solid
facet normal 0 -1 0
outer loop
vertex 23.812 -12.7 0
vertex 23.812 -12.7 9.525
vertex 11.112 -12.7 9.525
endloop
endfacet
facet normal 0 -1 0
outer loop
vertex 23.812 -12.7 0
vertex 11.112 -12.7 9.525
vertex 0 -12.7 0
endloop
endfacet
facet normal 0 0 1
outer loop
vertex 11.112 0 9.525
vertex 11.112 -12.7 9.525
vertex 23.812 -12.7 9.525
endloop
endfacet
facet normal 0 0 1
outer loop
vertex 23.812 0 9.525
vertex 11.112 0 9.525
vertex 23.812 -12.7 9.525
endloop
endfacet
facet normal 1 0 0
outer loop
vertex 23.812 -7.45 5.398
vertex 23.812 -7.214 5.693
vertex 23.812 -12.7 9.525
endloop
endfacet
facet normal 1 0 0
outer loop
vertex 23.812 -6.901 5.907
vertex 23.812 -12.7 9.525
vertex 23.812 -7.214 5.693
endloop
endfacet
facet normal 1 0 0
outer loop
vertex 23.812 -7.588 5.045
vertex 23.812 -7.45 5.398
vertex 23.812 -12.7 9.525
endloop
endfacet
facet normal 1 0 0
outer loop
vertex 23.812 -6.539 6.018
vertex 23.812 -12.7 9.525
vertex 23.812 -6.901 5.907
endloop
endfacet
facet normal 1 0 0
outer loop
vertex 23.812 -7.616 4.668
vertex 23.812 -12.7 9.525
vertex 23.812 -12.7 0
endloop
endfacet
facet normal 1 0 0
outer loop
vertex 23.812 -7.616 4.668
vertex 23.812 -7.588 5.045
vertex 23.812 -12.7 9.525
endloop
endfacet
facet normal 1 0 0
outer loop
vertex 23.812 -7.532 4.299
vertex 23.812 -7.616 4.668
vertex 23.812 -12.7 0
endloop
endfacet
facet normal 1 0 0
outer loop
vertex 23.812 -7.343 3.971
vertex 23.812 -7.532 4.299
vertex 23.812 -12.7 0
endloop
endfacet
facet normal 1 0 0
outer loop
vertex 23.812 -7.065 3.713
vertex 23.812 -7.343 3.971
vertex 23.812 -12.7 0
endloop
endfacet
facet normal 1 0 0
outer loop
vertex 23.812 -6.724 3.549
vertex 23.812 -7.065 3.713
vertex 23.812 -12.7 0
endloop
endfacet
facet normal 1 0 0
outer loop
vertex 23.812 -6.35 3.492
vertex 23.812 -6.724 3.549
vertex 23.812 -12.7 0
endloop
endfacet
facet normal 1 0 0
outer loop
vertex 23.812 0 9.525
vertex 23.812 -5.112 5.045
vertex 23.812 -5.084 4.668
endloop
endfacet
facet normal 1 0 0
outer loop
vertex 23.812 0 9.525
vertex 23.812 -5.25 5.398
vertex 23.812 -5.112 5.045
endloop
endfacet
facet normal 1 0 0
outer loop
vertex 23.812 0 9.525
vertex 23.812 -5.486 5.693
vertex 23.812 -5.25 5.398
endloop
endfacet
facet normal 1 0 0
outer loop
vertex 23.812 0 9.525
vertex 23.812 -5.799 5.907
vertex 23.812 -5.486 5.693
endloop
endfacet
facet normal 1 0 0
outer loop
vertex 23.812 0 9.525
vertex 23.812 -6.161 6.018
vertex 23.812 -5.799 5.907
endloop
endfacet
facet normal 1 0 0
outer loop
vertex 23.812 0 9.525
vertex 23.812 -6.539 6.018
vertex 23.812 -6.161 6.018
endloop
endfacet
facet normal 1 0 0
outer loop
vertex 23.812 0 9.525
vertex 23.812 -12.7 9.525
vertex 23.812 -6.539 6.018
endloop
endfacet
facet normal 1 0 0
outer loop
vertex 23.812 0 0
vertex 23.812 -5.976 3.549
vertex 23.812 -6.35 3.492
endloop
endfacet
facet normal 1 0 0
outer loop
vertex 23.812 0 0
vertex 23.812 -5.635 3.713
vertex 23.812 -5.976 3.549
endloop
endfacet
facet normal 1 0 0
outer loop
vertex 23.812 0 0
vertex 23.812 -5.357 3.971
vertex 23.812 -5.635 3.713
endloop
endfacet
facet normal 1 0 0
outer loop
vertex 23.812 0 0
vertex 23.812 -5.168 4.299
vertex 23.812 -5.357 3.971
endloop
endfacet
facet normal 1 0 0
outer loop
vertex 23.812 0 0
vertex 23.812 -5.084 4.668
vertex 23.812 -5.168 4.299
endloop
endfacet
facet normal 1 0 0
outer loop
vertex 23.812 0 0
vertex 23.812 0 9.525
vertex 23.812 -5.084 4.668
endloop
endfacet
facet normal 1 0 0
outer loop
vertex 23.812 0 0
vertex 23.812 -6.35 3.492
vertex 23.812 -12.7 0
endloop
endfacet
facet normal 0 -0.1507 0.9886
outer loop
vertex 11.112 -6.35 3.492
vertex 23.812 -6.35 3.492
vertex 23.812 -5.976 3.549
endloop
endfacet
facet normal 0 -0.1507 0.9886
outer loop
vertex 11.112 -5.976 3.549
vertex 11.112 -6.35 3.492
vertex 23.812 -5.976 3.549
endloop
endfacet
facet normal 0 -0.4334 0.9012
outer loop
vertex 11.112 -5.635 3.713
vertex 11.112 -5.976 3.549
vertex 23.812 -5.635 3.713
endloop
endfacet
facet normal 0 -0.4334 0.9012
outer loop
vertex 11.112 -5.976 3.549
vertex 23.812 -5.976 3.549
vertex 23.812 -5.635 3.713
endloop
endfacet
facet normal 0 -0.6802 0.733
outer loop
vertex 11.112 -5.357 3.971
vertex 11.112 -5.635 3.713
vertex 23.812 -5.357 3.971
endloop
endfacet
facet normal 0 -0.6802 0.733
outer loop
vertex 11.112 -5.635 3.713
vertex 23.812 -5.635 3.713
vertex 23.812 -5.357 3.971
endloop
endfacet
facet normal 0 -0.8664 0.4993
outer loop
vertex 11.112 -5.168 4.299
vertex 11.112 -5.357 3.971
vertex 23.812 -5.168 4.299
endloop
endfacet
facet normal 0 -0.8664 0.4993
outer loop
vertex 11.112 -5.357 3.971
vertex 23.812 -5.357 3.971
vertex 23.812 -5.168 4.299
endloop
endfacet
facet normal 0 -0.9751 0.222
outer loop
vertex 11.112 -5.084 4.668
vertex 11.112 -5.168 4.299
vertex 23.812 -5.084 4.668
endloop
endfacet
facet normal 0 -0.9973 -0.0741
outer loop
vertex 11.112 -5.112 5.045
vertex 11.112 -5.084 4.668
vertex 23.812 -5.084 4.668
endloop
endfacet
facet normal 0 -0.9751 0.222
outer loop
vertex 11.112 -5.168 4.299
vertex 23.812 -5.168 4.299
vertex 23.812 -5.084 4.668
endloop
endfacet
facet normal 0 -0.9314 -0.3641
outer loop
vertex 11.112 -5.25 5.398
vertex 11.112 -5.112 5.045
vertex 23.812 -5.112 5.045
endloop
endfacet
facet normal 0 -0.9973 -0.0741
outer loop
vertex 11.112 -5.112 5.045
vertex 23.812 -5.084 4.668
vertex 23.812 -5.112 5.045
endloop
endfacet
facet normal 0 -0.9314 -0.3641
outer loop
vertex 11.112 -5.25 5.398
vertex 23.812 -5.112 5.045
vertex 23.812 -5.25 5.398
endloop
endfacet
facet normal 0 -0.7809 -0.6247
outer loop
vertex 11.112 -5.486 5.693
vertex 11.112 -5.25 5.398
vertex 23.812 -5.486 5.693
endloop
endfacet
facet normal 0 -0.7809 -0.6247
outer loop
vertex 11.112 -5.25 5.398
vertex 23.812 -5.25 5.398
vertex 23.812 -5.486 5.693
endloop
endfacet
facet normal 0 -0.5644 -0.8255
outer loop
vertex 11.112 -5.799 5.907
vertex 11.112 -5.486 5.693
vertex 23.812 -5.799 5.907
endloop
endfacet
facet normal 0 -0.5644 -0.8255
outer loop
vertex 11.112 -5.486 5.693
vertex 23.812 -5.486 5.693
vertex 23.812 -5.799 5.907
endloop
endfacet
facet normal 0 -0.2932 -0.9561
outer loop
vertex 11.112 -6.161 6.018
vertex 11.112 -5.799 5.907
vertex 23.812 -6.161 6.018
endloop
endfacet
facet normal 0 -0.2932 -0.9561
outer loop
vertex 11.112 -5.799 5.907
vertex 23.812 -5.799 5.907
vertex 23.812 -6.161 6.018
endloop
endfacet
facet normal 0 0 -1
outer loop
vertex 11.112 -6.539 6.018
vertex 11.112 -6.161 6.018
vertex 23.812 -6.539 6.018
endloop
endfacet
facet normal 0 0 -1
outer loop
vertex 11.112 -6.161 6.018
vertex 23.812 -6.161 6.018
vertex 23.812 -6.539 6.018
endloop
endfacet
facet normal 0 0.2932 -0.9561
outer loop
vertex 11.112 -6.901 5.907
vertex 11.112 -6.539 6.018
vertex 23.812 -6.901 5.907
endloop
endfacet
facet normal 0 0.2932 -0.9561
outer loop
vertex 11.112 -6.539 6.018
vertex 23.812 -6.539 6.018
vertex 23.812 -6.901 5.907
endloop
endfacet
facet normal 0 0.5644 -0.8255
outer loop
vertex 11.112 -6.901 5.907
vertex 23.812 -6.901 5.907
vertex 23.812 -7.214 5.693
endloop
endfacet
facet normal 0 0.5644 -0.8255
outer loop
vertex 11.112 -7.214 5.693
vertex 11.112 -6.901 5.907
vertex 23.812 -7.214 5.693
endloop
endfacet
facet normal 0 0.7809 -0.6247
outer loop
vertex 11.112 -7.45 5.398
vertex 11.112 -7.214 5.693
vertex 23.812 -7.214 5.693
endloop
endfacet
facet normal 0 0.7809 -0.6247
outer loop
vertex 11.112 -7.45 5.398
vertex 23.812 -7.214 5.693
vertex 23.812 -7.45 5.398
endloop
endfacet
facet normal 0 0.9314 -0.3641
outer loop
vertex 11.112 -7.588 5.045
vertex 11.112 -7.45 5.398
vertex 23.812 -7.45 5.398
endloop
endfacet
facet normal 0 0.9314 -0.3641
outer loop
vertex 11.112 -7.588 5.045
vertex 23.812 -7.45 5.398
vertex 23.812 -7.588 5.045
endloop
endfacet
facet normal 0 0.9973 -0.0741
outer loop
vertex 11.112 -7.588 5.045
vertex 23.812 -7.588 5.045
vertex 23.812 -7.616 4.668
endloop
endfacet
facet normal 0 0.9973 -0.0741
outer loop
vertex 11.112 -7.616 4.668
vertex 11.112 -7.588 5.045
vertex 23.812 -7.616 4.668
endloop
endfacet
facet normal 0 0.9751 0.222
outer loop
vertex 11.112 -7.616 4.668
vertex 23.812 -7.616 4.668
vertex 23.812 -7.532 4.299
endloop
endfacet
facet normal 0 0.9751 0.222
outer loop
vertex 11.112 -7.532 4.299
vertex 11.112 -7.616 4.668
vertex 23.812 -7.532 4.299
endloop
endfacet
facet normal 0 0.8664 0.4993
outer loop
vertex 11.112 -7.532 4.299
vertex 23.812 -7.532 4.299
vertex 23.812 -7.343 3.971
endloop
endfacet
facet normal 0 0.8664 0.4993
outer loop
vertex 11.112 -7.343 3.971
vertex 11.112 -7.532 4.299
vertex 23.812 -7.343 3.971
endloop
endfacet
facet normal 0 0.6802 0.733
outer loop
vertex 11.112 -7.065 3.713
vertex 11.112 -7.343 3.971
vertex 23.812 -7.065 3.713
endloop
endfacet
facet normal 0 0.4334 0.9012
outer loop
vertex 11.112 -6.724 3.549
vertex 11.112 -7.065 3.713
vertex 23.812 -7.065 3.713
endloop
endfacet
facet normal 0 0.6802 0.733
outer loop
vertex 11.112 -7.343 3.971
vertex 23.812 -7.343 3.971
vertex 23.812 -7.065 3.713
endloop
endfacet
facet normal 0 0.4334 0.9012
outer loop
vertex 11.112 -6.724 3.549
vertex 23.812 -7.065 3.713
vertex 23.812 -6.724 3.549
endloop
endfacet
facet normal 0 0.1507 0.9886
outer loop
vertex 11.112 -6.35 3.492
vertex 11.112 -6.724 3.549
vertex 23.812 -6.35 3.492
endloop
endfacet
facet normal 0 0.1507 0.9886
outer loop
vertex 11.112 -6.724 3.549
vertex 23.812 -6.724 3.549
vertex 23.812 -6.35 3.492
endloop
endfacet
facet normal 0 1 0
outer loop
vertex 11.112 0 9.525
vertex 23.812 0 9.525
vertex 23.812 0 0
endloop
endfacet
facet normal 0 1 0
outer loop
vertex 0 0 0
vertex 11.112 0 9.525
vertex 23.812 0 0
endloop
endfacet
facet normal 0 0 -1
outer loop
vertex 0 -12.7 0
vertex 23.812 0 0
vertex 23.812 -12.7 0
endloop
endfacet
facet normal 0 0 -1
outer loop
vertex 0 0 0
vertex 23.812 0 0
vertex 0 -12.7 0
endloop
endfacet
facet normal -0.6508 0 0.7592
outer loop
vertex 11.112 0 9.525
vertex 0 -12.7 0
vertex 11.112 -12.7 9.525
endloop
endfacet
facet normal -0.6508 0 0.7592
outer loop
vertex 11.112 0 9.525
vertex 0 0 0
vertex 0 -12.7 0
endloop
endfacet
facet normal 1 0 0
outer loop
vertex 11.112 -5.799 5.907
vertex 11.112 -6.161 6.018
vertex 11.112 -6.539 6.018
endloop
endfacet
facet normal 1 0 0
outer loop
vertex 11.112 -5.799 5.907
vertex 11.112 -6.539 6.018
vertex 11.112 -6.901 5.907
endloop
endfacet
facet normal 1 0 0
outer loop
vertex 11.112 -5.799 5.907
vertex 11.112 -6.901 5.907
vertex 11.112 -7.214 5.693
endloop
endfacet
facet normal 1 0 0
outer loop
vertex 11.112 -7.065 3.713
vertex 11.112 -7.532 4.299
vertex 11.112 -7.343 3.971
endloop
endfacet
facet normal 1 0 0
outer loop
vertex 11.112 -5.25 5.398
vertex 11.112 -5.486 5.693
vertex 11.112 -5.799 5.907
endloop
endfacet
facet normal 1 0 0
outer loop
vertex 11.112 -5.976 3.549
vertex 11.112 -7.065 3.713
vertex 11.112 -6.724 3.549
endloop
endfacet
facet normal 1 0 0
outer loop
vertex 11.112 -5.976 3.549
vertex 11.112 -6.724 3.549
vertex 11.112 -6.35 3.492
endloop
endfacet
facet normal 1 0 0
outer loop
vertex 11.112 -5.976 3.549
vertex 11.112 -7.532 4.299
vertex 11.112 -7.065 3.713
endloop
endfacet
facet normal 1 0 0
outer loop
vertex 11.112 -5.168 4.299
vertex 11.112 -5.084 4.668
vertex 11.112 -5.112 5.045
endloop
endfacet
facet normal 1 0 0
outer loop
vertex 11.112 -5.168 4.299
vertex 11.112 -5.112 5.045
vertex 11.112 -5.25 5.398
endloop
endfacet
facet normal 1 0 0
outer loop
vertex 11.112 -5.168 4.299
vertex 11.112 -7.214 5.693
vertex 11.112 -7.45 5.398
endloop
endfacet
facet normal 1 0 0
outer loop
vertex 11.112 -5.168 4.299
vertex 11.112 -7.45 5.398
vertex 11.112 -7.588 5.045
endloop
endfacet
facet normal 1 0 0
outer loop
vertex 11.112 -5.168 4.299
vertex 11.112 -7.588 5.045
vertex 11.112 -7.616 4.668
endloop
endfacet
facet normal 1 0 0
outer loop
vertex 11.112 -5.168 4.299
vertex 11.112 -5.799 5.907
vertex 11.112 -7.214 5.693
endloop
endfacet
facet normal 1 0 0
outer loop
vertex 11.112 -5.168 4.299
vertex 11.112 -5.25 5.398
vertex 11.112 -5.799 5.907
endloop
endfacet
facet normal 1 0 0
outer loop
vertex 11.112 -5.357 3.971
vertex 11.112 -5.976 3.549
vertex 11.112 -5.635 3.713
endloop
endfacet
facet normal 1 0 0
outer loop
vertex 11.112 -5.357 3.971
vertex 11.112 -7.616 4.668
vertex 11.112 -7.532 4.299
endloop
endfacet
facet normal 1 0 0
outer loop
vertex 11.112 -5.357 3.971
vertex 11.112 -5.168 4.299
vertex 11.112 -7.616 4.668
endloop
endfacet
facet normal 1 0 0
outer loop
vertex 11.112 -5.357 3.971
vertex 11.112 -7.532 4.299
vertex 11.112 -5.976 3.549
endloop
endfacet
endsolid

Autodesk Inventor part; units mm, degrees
ref_plane "YZ Plane" through (0, 0, 0) normal (1, 0, 0) x (0, 1, 0)
ref_plane "XZ Plane" through (0, 0, 0) normal (0, 1, 0) x (-1, 0, 0)
ref_plane "XY Plane" through (0, 0, 0) normal (0, 0, 1) x (1, 0, 0)
sketch "Sketch1" plane through (0, 0, 0) normal (0, 1, 0) x (-1, 0, 0)
  line L0 (0, 0) -> (-11.1125, 9.525)
  line L1 (-11.1125, 9.525) -> (-23.8125, 9.525)
  line L2 (-23.8125, 9.525) -> (-23.8125, 0)
  line L3 (-23.8125, 0) -> (0, 0)
  dimension "plungerWidth" = 9.525
  dimension "plungerLength" = 12.7
  dimension "latchLength" = 11.1125
extrude "Extrusion1" add sketch "Sketch1" against normal blind 12.7
sketch "Sketch2" plane through (23.8125, 0, 9.525) normal (1, 0, 0) x (0, 0, -1)
  circle A0 centre (4.7625, -6.35) radius 1.27
  line L0 (0, 0) -> (9.525, 0) projected
  line L1 (0, 0) -> (0, -12.7) projected
  dimension "screwDiameter" = 2.54
  dimension "d8" = 6.35
  dimension "d9" = 4.7625
extrude "Extrusion2" cut sketch "Sketch2" against normal blind 12.7
equation "\"d8\" = 0.5 * plungerHeight"
equation "\"d9\" = 0.5 * plungerWidth"
equation "\"screwDepth\" = plungerLength"
equation "\"plungerTolerance\" = 1.5875"
equation "\"plungerHeight\" = 12.7"
properties part number "BatteryLatch-Latch"
